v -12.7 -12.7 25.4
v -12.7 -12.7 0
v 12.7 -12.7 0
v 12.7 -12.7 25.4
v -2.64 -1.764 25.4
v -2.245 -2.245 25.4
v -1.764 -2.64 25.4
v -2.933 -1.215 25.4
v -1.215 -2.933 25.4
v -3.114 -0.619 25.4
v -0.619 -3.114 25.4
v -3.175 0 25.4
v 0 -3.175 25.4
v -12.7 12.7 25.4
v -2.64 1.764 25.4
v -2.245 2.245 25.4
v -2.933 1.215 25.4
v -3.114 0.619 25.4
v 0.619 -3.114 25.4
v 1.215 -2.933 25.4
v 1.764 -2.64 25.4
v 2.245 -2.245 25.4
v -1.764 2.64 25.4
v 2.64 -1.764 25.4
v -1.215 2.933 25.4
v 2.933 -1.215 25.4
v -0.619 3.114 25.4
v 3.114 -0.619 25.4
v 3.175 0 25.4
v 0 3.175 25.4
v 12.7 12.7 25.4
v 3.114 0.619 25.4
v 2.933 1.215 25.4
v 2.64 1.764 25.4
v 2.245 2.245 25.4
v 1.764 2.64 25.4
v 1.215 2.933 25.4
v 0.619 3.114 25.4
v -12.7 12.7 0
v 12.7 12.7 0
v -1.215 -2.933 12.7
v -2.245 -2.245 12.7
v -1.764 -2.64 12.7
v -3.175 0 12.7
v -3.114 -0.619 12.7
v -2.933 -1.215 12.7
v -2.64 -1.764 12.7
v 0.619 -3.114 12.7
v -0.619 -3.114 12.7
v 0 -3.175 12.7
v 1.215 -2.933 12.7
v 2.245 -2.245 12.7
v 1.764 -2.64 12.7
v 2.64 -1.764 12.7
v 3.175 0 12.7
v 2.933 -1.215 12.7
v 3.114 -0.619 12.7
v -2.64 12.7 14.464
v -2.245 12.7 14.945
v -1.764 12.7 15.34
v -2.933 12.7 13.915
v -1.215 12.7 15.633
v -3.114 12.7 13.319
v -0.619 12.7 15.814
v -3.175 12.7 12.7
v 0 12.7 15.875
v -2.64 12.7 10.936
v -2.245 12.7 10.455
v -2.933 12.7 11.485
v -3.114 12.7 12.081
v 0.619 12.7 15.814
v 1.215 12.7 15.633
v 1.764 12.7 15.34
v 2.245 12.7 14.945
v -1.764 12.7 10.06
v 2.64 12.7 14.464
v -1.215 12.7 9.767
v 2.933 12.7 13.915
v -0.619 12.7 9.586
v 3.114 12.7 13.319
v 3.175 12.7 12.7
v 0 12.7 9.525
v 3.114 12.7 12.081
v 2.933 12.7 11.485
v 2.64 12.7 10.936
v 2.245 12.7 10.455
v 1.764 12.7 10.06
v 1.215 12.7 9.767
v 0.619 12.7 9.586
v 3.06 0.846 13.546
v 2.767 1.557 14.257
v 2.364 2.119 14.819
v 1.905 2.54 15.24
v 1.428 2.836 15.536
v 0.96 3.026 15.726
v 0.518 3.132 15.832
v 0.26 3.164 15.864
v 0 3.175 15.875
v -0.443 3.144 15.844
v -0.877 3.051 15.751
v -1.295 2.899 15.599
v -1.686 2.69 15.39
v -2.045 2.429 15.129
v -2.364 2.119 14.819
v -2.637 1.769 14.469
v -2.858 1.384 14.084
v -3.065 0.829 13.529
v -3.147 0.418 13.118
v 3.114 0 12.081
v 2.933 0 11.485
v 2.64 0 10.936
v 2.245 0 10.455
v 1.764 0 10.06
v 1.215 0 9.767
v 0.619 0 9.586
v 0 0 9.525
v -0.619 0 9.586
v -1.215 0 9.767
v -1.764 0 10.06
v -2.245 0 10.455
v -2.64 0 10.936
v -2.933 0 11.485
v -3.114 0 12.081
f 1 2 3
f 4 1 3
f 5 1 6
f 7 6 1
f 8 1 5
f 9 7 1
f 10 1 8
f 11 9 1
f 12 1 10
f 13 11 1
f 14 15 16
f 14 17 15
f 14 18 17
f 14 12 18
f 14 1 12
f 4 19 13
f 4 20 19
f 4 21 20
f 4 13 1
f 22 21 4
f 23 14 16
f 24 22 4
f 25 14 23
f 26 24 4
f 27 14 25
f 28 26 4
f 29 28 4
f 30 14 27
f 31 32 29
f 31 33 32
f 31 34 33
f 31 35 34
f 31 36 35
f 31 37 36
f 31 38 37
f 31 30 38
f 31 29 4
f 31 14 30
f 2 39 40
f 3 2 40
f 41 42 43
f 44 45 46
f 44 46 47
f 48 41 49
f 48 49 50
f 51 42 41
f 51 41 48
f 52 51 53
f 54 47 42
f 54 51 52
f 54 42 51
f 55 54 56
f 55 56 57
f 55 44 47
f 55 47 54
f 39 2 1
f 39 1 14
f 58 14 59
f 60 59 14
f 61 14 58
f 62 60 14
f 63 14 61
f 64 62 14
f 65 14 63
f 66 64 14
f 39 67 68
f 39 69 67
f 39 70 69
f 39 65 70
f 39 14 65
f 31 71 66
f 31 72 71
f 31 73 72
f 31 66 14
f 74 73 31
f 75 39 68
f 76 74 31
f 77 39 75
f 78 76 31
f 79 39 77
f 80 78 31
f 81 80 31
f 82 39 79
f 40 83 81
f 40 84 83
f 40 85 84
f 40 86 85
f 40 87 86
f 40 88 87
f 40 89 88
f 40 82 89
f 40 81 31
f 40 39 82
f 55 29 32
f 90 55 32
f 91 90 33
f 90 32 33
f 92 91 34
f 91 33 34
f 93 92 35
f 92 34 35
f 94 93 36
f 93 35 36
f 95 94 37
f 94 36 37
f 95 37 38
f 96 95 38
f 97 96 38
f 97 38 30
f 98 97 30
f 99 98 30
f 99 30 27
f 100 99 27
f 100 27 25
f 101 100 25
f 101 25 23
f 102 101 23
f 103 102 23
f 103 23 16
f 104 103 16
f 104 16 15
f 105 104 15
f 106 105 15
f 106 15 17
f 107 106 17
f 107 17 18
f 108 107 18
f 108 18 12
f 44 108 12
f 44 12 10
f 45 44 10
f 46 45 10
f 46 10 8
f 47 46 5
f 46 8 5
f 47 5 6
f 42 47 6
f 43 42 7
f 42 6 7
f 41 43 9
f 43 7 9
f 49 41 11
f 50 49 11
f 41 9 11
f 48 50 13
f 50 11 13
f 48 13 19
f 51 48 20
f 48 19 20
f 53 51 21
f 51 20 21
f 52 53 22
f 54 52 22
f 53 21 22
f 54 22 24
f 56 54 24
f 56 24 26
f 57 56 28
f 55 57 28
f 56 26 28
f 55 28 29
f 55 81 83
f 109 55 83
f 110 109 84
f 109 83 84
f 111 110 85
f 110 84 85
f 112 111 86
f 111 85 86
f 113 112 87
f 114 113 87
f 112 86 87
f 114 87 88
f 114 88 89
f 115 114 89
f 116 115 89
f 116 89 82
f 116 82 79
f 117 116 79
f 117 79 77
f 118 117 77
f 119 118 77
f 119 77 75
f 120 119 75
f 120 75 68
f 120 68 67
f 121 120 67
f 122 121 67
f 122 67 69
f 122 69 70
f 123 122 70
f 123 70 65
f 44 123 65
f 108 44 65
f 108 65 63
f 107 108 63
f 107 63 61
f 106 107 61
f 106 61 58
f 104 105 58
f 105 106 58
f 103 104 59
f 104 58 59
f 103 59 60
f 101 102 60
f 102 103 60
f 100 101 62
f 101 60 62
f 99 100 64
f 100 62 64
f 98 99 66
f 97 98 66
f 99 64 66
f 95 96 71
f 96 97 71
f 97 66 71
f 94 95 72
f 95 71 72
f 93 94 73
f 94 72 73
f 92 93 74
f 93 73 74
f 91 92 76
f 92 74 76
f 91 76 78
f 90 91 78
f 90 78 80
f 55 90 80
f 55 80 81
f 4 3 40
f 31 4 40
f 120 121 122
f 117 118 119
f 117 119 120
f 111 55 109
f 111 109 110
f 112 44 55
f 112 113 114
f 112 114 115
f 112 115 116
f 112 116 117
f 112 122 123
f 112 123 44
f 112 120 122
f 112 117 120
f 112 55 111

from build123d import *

# Parameters (mm, degrees)
SKETCH1_W           = 25.4
SKETCH1_H           = 25.4
BOSS_EXTRUDE1_DEPTH = 25.4
SKETCH2_R           = 3.175
CUT_EXTRUDE1_DEPTH  = 12.7
SKETCH3_R           = 3.175
CUT_EXTRUDE2_DEPTH  = 12.7


with BuildPart() as part:
    # Sketch1 → Boss-Extrude1 (new body)
    with BuildSketch(Plane.XY):
        Rectangle(SKETCH1_W, SKETCH1_H)
    extrude(amount=BOSS_EXTRUDE1_DEPTH)

    # Sketch2 → Cut-Extrude1 (cut)
    with BuildSketch(Plane.XY.offset(25.4)):
        Circle(SKETCH2_R)
    extrude(amount=-CUT_EXTRUDE1_DEPTH, mode=Mode.SUBTRACT)

    # Sketch3 → Cut-Extrude2 (cut)
    with BuildSketch(Plane(origin=(0, 12.7, 0), x_dir=(1, 0, 0), z_dir=(0, 1, 0))):
        with Locations((0, -12.7)):
            Circle(SKETCH3_R)
    extrude(amount=-CUT_EXTRUDE2_DEPTH, mode=Mode.SUBTRACT)


solid = part.part
